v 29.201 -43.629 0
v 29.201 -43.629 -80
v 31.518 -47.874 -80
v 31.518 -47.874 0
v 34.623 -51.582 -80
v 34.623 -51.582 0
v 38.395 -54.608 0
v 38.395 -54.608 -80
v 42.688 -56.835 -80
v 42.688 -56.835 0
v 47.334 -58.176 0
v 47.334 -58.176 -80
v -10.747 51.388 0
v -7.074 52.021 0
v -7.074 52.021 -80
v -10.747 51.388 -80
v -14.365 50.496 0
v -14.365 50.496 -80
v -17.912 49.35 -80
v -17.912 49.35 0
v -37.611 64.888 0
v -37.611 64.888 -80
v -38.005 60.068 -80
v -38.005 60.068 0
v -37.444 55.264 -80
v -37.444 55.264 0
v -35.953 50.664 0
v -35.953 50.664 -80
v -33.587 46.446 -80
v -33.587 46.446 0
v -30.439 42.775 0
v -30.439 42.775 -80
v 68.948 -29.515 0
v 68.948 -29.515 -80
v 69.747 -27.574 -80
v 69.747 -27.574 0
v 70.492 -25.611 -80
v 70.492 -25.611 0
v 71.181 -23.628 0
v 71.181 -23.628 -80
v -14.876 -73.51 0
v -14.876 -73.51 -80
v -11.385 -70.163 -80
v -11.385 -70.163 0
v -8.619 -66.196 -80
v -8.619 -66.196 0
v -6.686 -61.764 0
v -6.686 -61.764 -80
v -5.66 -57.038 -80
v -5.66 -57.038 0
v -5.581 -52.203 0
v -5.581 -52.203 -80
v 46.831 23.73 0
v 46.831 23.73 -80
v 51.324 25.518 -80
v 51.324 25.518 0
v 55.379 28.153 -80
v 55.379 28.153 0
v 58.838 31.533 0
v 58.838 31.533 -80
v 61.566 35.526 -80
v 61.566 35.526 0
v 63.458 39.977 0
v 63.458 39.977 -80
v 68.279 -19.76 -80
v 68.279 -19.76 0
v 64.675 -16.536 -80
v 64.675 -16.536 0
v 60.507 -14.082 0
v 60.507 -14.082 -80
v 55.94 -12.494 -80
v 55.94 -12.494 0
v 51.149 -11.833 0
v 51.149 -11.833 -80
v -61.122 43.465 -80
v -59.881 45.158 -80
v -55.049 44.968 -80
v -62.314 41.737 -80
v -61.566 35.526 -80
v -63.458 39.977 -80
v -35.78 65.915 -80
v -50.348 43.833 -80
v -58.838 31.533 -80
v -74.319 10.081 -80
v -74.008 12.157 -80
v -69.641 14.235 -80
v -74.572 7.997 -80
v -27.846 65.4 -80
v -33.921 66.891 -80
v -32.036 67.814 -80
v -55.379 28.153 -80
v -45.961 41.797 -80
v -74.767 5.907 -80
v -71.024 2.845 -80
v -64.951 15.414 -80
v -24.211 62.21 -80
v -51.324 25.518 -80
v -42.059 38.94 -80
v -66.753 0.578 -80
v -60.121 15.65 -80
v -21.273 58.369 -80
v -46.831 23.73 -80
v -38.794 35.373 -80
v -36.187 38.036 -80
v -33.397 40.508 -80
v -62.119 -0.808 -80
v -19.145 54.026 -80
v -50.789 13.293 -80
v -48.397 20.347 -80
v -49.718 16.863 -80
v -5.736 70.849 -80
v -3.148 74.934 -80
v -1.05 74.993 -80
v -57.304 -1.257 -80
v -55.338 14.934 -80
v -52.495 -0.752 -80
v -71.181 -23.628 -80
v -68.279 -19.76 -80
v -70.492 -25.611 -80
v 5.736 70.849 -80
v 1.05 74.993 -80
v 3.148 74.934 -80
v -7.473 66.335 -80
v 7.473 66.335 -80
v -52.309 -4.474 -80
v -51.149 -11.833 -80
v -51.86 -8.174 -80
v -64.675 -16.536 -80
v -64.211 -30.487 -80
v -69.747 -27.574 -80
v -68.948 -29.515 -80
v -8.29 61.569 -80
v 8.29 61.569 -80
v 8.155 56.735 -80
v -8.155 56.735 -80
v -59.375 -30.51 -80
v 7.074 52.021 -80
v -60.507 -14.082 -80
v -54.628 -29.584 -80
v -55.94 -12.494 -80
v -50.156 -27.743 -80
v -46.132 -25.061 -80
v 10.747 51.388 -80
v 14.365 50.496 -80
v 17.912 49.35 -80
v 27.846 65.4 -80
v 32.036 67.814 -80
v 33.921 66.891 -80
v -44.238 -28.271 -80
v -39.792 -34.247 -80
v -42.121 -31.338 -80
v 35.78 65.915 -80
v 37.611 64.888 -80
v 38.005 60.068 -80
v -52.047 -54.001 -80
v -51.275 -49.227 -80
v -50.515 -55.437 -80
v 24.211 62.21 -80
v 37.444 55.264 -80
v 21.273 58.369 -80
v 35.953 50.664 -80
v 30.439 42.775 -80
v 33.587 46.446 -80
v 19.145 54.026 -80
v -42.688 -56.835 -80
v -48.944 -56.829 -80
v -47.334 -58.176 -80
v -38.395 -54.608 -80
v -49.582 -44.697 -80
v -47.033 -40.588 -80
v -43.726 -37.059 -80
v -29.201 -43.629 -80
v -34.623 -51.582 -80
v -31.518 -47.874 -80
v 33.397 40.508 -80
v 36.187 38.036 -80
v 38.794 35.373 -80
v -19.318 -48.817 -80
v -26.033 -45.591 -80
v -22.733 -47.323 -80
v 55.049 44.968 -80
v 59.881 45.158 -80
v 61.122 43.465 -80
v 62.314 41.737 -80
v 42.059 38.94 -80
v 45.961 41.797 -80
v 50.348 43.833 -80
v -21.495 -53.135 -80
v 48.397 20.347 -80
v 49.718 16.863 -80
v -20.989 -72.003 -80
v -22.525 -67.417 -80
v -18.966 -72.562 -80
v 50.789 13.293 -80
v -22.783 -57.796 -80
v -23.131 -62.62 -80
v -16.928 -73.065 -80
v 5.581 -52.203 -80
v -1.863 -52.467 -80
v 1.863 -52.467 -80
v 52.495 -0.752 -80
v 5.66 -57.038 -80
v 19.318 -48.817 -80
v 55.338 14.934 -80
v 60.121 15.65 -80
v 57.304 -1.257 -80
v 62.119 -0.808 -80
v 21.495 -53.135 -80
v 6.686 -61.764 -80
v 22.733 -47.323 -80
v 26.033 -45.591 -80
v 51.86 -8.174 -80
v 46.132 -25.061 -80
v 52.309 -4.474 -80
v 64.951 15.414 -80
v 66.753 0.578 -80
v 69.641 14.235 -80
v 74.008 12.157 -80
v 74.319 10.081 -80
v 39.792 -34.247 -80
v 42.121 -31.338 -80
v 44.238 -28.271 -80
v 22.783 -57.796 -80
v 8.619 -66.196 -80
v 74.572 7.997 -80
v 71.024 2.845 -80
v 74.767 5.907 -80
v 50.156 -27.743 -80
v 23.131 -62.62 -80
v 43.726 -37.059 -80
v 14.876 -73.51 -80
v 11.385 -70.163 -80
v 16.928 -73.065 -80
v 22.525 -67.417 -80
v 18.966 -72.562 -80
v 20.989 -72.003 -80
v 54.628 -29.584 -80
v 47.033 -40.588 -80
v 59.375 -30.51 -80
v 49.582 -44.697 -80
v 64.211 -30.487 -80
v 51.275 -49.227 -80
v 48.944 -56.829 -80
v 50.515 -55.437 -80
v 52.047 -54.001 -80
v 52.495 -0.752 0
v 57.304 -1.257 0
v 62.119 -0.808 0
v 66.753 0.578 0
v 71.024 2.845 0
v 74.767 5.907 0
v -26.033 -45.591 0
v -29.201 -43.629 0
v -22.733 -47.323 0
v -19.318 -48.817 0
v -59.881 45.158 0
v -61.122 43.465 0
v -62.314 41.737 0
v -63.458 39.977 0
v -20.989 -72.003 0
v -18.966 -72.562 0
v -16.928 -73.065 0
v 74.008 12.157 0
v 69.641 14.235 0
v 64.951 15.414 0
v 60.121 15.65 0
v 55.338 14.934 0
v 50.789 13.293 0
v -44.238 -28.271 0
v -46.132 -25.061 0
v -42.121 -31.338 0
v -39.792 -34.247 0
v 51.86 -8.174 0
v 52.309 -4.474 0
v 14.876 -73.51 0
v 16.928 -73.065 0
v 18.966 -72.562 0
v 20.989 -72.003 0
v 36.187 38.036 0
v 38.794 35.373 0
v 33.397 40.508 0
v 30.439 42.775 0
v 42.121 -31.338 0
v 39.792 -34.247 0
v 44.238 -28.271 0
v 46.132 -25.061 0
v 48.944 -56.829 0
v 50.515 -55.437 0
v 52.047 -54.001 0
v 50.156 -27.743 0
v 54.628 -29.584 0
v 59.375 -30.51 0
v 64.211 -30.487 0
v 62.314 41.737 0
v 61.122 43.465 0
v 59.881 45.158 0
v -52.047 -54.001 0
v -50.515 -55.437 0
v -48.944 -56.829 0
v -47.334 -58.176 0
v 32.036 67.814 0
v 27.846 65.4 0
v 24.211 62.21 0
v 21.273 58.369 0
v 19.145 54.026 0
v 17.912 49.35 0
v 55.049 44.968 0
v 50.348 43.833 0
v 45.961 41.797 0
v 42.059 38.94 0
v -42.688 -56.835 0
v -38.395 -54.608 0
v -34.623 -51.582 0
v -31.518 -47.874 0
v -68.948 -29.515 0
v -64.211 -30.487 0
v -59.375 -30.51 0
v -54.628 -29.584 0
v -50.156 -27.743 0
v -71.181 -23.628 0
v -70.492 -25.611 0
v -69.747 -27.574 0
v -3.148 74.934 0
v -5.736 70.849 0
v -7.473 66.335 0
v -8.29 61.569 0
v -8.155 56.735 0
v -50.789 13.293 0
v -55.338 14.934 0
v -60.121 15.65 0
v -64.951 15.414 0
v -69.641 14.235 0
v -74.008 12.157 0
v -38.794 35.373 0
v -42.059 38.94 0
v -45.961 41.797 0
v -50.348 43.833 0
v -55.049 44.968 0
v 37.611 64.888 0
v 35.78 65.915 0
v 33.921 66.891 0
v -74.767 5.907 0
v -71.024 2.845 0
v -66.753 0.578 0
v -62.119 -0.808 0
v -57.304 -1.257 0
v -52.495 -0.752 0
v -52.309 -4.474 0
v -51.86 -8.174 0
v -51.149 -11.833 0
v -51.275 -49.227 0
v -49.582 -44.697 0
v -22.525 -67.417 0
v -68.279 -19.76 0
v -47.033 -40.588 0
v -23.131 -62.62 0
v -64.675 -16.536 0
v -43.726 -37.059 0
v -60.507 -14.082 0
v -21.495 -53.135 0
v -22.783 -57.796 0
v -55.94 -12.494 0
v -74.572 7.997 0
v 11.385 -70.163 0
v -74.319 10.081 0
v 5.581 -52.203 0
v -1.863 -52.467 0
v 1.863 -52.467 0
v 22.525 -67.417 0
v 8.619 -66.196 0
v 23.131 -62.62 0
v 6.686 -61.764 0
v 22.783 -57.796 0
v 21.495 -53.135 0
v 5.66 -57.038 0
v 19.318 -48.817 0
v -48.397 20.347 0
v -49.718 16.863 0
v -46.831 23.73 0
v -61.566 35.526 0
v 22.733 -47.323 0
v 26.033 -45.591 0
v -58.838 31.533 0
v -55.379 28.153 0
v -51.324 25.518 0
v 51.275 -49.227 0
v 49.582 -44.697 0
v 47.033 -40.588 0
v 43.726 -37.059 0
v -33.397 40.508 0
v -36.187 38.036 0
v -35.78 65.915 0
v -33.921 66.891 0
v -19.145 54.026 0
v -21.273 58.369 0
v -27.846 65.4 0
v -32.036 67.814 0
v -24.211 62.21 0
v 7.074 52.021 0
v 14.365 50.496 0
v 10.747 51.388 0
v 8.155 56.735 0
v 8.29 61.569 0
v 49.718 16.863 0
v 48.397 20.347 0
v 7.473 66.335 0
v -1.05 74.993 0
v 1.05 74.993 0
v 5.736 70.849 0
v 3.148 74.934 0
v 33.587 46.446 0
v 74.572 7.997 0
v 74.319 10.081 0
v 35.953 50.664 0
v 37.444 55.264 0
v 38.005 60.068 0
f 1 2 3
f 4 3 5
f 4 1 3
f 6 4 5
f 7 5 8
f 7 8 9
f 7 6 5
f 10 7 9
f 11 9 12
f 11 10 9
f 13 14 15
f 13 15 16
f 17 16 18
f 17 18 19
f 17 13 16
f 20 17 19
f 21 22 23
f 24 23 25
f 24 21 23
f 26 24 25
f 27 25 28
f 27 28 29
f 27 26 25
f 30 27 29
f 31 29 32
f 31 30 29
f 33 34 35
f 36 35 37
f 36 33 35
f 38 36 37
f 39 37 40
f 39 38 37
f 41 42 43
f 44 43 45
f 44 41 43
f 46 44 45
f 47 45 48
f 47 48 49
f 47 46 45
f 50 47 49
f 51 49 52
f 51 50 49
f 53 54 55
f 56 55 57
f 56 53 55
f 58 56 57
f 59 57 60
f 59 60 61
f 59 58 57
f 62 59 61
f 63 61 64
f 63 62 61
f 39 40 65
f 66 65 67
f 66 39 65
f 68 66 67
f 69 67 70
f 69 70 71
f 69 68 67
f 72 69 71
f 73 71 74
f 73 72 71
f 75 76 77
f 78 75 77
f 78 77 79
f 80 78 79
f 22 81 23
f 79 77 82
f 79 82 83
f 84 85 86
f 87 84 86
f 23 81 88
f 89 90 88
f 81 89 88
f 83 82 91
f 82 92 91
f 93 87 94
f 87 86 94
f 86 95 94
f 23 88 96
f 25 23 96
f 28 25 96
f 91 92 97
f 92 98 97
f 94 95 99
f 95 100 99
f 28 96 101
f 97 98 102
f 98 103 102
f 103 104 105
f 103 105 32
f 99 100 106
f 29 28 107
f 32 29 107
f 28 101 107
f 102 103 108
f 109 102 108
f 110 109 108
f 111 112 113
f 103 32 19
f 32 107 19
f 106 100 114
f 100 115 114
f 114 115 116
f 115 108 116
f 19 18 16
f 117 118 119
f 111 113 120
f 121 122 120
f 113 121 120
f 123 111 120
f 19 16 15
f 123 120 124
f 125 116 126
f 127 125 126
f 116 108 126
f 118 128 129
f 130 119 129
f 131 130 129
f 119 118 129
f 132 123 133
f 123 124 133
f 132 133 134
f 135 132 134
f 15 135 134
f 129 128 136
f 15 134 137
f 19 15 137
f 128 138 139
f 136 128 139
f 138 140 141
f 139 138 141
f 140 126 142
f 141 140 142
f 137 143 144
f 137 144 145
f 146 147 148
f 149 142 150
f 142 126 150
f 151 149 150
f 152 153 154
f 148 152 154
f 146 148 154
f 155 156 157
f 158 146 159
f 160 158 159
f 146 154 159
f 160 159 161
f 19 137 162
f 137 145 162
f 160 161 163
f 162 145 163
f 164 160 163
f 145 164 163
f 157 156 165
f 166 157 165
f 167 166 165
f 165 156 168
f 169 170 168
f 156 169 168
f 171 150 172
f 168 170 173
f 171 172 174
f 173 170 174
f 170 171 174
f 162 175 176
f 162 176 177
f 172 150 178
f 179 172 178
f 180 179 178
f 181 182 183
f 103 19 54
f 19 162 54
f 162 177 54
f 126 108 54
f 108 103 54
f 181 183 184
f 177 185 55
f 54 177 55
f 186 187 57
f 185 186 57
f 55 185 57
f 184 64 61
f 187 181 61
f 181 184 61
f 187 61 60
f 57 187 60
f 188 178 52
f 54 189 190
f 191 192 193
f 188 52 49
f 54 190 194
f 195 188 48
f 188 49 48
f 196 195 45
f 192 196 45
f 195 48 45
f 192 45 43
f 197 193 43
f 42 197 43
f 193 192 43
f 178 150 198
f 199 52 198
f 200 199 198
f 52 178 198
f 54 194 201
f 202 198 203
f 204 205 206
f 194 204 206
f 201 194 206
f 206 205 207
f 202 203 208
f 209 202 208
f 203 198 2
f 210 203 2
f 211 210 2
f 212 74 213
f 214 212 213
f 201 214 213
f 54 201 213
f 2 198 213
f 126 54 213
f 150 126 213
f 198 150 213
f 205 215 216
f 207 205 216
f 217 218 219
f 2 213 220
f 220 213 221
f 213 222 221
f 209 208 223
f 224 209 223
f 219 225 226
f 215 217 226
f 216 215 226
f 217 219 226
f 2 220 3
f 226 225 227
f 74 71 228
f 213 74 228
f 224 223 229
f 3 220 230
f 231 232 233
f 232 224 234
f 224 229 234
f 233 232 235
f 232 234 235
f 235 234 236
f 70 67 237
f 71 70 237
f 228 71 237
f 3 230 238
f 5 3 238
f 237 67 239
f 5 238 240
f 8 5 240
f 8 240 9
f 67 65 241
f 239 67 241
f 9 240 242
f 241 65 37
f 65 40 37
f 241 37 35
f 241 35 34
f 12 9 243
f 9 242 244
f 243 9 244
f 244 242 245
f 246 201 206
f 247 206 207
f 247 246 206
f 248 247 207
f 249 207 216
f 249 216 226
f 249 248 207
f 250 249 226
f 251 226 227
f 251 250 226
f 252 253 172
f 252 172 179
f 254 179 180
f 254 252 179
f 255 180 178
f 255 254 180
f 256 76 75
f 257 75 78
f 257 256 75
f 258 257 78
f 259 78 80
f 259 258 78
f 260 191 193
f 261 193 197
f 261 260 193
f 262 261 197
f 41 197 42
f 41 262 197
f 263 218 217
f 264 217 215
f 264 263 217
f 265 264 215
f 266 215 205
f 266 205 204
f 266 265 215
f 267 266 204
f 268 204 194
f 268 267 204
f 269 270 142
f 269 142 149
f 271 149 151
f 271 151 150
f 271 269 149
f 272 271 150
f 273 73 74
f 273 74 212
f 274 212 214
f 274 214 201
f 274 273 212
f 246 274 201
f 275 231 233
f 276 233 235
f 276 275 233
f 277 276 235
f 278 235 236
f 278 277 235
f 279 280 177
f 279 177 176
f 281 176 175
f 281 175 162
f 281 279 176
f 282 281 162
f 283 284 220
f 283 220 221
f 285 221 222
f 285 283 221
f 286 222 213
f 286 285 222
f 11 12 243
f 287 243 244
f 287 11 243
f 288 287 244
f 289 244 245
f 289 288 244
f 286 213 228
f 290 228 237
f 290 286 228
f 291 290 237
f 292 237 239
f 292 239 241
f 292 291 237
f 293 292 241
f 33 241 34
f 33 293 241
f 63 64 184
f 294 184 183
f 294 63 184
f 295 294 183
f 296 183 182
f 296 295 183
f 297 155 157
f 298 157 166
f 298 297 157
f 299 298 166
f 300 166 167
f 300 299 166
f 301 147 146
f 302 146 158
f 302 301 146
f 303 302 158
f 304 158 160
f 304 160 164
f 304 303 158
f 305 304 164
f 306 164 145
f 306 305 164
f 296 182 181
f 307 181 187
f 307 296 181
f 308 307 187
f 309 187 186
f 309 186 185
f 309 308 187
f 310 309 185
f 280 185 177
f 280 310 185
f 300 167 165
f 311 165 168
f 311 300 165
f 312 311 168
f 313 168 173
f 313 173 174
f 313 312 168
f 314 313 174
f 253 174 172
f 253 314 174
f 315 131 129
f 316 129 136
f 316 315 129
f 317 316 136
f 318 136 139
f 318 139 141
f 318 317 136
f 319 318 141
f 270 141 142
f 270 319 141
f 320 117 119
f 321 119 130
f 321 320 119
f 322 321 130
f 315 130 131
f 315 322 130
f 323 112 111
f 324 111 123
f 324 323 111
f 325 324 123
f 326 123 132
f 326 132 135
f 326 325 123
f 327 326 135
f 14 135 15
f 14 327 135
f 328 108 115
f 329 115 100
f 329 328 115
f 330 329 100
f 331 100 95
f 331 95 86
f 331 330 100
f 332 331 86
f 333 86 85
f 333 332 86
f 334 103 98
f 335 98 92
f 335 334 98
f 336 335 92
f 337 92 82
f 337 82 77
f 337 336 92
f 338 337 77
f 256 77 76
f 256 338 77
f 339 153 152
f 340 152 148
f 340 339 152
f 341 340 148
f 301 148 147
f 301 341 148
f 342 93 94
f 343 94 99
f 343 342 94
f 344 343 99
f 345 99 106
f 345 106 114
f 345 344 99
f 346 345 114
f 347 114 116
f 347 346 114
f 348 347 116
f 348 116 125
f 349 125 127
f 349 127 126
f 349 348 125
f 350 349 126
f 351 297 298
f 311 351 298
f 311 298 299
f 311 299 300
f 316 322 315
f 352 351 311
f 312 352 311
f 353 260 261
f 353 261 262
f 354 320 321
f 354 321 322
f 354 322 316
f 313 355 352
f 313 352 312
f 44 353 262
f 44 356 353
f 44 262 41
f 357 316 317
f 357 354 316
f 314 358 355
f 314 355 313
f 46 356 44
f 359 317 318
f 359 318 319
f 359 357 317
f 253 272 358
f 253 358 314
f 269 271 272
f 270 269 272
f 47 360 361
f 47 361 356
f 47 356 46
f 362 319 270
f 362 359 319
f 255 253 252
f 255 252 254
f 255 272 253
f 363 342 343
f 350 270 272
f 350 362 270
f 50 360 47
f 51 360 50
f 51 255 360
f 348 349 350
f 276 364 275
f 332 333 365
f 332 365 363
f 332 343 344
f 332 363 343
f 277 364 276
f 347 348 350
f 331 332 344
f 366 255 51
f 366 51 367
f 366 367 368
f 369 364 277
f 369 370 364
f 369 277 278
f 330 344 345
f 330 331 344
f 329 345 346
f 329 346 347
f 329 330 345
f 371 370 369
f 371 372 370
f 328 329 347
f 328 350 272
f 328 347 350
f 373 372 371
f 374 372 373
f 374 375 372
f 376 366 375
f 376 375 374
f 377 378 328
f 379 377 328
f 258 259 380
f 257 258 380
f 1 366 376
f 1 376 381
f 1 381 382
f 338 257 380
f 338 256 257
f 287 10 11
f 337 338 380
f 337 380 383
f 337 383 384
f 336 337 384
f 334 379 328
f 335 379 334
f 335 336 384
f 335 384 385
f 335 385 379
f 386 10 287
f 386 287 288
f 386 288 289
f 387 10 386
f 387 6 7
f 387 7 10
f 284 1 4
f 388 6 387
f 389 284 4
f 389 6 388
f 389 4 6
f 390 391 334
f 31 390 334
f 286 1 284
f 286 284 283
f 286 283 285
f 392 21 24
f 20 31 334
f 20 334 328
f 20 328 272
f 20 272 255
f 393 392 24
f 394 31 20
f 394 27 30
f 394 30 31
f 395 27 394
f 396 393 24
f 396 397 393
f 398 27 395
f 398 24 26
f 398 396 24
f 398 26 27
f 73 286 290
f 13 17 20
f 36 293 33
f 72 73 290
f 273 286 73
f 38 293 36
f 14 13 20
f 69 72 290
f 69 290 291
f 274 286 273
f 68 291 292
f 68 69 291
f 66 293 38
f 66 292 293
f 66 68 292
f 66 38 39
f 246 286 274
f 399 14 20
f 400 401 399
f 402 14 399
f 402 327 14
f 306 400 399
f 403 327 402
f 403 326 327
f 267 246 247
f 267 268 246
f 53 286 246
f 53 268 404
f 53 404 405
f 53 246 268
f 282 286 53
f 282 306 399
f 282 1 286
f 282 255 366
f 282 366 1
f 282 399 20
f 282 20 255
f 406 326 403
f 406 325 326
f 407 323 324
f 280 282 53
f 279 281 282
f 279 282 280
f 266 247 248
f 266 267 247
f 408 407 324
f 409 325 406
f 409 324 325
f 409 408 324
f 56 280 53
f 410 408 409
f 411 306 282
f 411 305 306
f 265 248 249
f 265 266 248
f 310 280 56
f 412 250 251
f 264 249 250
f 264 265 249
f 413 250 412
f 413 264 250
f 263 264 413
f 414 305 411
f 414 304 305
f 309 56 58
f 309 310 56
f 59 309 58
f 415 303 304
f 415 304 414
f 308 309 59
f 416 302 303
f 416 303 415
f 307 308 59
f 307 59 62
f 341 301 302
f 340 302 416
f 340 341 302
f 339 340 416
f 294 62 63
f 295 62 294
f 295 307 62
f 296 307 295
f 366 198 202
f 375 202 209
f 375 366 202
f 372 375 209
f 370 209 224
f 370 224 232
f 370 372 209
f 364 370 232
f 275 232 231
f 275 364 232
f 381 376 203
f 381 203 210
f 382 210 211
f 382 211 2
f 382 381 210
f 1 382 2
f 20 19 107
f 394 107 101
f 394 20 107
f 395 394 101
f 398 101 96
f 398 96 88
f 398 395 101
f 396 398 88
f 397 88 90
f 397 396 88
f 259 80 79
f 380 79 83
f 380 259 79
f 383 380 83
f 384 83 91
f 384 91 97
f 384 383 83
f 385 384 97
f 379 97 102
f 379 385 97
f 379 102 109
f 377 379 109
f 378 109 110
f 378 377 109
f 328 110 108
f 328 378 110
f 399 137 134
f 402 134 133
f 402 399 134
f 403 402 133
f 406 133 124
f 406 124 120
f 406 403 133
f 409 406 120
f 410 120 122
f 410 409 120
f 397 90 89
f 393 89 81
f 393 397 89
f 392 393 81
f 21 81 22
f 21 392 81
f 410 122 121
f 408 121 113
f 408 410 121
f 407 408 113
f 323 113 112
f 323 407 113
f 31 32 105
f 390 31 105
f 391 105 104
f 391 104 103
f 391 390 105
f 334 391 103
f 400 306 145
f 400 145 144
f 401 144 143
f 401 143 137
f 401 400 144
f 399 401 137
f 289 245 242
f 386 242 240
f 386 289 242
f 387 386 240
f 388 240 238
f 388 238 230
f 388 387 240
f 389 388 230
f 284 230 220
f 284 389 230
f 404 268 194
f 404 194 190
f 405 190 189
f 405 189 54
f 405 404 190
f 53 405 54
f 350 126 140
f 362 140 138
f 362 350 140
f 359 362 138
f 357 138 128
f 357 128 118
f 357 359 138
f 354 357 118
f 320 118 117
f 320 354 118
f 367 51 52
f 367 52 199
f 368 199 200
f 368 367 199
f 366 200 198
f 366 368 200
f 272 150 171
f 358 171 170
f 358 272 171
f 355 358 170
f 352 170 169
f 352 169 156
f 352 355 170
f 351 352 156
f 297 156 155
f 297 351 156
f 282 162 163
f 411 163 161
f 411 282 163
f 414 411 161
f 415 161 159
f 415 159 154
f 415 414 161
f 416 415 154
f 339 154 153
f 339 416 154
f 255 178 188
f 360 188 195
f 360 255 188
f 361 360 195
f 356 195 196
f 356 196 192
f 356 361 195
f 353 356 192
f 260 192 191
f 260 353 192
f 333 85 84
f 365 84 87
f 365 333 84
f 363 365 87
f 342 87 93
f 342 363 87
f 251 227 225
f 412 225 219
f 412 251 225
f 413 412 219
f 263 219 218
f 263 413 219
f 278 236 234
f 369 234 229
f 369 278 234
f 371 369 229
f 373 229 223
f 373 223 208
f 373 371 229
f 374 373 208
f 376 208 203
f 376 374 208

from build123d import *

# Parameters (mm, degrees)
SKETCH1_R           = 52.5
BASE_EXTRUDE_DEPTH  = 80
BOSS_EXTRUDE1_DEPTH = 80
CIRPATTERN1_COUNT   = 13


with BuildPart() as part:
    # Sketch1 → Base-Extrude (new body)
    with BuildSketch(Plane.XY):
        Circle(SKETCH1_R)
    extrude(amount=-BASE_EXTRUDE_DEPTH)

    # Sketch2 → Boss-Extrude1 (add)
    with BuildSketch(Plane.XY):
        with BuildLine():
            Line((-7.074123552, 52.021214672), (7.074123552, 52.021214672))
            ThreePointArc((7.074123552, 52.021214672), (7.998957546, 63.972407881), (3.148075167, 74.93394414))
            ThreePointArc((3.148075167, 74.93394414), (0, 75.000042411), (-3.148075167, 74.93394414))
            ThreePointArc((-3.148075167, 74.93394414), (-7.998957546, 63.972407881), (-7.074123552, 52.021214672))
        make_face()
    boss_extrude1 = extrude(amount=-BOSS_EXTRUDE1_DEPTH)

    # CirPattern1: Boss-Extrude1 ×13 about axis
    cirpattern1_axis = Axis((0, 0, 0), (0, 0, 1))
    for i in range(1, CIRPATTERN1_COUNT):
        add(boss_extrude1.rotate(cirpattern1_axis, i * 360 / CIRPATTERN1_COUNT))


solid = part.part
